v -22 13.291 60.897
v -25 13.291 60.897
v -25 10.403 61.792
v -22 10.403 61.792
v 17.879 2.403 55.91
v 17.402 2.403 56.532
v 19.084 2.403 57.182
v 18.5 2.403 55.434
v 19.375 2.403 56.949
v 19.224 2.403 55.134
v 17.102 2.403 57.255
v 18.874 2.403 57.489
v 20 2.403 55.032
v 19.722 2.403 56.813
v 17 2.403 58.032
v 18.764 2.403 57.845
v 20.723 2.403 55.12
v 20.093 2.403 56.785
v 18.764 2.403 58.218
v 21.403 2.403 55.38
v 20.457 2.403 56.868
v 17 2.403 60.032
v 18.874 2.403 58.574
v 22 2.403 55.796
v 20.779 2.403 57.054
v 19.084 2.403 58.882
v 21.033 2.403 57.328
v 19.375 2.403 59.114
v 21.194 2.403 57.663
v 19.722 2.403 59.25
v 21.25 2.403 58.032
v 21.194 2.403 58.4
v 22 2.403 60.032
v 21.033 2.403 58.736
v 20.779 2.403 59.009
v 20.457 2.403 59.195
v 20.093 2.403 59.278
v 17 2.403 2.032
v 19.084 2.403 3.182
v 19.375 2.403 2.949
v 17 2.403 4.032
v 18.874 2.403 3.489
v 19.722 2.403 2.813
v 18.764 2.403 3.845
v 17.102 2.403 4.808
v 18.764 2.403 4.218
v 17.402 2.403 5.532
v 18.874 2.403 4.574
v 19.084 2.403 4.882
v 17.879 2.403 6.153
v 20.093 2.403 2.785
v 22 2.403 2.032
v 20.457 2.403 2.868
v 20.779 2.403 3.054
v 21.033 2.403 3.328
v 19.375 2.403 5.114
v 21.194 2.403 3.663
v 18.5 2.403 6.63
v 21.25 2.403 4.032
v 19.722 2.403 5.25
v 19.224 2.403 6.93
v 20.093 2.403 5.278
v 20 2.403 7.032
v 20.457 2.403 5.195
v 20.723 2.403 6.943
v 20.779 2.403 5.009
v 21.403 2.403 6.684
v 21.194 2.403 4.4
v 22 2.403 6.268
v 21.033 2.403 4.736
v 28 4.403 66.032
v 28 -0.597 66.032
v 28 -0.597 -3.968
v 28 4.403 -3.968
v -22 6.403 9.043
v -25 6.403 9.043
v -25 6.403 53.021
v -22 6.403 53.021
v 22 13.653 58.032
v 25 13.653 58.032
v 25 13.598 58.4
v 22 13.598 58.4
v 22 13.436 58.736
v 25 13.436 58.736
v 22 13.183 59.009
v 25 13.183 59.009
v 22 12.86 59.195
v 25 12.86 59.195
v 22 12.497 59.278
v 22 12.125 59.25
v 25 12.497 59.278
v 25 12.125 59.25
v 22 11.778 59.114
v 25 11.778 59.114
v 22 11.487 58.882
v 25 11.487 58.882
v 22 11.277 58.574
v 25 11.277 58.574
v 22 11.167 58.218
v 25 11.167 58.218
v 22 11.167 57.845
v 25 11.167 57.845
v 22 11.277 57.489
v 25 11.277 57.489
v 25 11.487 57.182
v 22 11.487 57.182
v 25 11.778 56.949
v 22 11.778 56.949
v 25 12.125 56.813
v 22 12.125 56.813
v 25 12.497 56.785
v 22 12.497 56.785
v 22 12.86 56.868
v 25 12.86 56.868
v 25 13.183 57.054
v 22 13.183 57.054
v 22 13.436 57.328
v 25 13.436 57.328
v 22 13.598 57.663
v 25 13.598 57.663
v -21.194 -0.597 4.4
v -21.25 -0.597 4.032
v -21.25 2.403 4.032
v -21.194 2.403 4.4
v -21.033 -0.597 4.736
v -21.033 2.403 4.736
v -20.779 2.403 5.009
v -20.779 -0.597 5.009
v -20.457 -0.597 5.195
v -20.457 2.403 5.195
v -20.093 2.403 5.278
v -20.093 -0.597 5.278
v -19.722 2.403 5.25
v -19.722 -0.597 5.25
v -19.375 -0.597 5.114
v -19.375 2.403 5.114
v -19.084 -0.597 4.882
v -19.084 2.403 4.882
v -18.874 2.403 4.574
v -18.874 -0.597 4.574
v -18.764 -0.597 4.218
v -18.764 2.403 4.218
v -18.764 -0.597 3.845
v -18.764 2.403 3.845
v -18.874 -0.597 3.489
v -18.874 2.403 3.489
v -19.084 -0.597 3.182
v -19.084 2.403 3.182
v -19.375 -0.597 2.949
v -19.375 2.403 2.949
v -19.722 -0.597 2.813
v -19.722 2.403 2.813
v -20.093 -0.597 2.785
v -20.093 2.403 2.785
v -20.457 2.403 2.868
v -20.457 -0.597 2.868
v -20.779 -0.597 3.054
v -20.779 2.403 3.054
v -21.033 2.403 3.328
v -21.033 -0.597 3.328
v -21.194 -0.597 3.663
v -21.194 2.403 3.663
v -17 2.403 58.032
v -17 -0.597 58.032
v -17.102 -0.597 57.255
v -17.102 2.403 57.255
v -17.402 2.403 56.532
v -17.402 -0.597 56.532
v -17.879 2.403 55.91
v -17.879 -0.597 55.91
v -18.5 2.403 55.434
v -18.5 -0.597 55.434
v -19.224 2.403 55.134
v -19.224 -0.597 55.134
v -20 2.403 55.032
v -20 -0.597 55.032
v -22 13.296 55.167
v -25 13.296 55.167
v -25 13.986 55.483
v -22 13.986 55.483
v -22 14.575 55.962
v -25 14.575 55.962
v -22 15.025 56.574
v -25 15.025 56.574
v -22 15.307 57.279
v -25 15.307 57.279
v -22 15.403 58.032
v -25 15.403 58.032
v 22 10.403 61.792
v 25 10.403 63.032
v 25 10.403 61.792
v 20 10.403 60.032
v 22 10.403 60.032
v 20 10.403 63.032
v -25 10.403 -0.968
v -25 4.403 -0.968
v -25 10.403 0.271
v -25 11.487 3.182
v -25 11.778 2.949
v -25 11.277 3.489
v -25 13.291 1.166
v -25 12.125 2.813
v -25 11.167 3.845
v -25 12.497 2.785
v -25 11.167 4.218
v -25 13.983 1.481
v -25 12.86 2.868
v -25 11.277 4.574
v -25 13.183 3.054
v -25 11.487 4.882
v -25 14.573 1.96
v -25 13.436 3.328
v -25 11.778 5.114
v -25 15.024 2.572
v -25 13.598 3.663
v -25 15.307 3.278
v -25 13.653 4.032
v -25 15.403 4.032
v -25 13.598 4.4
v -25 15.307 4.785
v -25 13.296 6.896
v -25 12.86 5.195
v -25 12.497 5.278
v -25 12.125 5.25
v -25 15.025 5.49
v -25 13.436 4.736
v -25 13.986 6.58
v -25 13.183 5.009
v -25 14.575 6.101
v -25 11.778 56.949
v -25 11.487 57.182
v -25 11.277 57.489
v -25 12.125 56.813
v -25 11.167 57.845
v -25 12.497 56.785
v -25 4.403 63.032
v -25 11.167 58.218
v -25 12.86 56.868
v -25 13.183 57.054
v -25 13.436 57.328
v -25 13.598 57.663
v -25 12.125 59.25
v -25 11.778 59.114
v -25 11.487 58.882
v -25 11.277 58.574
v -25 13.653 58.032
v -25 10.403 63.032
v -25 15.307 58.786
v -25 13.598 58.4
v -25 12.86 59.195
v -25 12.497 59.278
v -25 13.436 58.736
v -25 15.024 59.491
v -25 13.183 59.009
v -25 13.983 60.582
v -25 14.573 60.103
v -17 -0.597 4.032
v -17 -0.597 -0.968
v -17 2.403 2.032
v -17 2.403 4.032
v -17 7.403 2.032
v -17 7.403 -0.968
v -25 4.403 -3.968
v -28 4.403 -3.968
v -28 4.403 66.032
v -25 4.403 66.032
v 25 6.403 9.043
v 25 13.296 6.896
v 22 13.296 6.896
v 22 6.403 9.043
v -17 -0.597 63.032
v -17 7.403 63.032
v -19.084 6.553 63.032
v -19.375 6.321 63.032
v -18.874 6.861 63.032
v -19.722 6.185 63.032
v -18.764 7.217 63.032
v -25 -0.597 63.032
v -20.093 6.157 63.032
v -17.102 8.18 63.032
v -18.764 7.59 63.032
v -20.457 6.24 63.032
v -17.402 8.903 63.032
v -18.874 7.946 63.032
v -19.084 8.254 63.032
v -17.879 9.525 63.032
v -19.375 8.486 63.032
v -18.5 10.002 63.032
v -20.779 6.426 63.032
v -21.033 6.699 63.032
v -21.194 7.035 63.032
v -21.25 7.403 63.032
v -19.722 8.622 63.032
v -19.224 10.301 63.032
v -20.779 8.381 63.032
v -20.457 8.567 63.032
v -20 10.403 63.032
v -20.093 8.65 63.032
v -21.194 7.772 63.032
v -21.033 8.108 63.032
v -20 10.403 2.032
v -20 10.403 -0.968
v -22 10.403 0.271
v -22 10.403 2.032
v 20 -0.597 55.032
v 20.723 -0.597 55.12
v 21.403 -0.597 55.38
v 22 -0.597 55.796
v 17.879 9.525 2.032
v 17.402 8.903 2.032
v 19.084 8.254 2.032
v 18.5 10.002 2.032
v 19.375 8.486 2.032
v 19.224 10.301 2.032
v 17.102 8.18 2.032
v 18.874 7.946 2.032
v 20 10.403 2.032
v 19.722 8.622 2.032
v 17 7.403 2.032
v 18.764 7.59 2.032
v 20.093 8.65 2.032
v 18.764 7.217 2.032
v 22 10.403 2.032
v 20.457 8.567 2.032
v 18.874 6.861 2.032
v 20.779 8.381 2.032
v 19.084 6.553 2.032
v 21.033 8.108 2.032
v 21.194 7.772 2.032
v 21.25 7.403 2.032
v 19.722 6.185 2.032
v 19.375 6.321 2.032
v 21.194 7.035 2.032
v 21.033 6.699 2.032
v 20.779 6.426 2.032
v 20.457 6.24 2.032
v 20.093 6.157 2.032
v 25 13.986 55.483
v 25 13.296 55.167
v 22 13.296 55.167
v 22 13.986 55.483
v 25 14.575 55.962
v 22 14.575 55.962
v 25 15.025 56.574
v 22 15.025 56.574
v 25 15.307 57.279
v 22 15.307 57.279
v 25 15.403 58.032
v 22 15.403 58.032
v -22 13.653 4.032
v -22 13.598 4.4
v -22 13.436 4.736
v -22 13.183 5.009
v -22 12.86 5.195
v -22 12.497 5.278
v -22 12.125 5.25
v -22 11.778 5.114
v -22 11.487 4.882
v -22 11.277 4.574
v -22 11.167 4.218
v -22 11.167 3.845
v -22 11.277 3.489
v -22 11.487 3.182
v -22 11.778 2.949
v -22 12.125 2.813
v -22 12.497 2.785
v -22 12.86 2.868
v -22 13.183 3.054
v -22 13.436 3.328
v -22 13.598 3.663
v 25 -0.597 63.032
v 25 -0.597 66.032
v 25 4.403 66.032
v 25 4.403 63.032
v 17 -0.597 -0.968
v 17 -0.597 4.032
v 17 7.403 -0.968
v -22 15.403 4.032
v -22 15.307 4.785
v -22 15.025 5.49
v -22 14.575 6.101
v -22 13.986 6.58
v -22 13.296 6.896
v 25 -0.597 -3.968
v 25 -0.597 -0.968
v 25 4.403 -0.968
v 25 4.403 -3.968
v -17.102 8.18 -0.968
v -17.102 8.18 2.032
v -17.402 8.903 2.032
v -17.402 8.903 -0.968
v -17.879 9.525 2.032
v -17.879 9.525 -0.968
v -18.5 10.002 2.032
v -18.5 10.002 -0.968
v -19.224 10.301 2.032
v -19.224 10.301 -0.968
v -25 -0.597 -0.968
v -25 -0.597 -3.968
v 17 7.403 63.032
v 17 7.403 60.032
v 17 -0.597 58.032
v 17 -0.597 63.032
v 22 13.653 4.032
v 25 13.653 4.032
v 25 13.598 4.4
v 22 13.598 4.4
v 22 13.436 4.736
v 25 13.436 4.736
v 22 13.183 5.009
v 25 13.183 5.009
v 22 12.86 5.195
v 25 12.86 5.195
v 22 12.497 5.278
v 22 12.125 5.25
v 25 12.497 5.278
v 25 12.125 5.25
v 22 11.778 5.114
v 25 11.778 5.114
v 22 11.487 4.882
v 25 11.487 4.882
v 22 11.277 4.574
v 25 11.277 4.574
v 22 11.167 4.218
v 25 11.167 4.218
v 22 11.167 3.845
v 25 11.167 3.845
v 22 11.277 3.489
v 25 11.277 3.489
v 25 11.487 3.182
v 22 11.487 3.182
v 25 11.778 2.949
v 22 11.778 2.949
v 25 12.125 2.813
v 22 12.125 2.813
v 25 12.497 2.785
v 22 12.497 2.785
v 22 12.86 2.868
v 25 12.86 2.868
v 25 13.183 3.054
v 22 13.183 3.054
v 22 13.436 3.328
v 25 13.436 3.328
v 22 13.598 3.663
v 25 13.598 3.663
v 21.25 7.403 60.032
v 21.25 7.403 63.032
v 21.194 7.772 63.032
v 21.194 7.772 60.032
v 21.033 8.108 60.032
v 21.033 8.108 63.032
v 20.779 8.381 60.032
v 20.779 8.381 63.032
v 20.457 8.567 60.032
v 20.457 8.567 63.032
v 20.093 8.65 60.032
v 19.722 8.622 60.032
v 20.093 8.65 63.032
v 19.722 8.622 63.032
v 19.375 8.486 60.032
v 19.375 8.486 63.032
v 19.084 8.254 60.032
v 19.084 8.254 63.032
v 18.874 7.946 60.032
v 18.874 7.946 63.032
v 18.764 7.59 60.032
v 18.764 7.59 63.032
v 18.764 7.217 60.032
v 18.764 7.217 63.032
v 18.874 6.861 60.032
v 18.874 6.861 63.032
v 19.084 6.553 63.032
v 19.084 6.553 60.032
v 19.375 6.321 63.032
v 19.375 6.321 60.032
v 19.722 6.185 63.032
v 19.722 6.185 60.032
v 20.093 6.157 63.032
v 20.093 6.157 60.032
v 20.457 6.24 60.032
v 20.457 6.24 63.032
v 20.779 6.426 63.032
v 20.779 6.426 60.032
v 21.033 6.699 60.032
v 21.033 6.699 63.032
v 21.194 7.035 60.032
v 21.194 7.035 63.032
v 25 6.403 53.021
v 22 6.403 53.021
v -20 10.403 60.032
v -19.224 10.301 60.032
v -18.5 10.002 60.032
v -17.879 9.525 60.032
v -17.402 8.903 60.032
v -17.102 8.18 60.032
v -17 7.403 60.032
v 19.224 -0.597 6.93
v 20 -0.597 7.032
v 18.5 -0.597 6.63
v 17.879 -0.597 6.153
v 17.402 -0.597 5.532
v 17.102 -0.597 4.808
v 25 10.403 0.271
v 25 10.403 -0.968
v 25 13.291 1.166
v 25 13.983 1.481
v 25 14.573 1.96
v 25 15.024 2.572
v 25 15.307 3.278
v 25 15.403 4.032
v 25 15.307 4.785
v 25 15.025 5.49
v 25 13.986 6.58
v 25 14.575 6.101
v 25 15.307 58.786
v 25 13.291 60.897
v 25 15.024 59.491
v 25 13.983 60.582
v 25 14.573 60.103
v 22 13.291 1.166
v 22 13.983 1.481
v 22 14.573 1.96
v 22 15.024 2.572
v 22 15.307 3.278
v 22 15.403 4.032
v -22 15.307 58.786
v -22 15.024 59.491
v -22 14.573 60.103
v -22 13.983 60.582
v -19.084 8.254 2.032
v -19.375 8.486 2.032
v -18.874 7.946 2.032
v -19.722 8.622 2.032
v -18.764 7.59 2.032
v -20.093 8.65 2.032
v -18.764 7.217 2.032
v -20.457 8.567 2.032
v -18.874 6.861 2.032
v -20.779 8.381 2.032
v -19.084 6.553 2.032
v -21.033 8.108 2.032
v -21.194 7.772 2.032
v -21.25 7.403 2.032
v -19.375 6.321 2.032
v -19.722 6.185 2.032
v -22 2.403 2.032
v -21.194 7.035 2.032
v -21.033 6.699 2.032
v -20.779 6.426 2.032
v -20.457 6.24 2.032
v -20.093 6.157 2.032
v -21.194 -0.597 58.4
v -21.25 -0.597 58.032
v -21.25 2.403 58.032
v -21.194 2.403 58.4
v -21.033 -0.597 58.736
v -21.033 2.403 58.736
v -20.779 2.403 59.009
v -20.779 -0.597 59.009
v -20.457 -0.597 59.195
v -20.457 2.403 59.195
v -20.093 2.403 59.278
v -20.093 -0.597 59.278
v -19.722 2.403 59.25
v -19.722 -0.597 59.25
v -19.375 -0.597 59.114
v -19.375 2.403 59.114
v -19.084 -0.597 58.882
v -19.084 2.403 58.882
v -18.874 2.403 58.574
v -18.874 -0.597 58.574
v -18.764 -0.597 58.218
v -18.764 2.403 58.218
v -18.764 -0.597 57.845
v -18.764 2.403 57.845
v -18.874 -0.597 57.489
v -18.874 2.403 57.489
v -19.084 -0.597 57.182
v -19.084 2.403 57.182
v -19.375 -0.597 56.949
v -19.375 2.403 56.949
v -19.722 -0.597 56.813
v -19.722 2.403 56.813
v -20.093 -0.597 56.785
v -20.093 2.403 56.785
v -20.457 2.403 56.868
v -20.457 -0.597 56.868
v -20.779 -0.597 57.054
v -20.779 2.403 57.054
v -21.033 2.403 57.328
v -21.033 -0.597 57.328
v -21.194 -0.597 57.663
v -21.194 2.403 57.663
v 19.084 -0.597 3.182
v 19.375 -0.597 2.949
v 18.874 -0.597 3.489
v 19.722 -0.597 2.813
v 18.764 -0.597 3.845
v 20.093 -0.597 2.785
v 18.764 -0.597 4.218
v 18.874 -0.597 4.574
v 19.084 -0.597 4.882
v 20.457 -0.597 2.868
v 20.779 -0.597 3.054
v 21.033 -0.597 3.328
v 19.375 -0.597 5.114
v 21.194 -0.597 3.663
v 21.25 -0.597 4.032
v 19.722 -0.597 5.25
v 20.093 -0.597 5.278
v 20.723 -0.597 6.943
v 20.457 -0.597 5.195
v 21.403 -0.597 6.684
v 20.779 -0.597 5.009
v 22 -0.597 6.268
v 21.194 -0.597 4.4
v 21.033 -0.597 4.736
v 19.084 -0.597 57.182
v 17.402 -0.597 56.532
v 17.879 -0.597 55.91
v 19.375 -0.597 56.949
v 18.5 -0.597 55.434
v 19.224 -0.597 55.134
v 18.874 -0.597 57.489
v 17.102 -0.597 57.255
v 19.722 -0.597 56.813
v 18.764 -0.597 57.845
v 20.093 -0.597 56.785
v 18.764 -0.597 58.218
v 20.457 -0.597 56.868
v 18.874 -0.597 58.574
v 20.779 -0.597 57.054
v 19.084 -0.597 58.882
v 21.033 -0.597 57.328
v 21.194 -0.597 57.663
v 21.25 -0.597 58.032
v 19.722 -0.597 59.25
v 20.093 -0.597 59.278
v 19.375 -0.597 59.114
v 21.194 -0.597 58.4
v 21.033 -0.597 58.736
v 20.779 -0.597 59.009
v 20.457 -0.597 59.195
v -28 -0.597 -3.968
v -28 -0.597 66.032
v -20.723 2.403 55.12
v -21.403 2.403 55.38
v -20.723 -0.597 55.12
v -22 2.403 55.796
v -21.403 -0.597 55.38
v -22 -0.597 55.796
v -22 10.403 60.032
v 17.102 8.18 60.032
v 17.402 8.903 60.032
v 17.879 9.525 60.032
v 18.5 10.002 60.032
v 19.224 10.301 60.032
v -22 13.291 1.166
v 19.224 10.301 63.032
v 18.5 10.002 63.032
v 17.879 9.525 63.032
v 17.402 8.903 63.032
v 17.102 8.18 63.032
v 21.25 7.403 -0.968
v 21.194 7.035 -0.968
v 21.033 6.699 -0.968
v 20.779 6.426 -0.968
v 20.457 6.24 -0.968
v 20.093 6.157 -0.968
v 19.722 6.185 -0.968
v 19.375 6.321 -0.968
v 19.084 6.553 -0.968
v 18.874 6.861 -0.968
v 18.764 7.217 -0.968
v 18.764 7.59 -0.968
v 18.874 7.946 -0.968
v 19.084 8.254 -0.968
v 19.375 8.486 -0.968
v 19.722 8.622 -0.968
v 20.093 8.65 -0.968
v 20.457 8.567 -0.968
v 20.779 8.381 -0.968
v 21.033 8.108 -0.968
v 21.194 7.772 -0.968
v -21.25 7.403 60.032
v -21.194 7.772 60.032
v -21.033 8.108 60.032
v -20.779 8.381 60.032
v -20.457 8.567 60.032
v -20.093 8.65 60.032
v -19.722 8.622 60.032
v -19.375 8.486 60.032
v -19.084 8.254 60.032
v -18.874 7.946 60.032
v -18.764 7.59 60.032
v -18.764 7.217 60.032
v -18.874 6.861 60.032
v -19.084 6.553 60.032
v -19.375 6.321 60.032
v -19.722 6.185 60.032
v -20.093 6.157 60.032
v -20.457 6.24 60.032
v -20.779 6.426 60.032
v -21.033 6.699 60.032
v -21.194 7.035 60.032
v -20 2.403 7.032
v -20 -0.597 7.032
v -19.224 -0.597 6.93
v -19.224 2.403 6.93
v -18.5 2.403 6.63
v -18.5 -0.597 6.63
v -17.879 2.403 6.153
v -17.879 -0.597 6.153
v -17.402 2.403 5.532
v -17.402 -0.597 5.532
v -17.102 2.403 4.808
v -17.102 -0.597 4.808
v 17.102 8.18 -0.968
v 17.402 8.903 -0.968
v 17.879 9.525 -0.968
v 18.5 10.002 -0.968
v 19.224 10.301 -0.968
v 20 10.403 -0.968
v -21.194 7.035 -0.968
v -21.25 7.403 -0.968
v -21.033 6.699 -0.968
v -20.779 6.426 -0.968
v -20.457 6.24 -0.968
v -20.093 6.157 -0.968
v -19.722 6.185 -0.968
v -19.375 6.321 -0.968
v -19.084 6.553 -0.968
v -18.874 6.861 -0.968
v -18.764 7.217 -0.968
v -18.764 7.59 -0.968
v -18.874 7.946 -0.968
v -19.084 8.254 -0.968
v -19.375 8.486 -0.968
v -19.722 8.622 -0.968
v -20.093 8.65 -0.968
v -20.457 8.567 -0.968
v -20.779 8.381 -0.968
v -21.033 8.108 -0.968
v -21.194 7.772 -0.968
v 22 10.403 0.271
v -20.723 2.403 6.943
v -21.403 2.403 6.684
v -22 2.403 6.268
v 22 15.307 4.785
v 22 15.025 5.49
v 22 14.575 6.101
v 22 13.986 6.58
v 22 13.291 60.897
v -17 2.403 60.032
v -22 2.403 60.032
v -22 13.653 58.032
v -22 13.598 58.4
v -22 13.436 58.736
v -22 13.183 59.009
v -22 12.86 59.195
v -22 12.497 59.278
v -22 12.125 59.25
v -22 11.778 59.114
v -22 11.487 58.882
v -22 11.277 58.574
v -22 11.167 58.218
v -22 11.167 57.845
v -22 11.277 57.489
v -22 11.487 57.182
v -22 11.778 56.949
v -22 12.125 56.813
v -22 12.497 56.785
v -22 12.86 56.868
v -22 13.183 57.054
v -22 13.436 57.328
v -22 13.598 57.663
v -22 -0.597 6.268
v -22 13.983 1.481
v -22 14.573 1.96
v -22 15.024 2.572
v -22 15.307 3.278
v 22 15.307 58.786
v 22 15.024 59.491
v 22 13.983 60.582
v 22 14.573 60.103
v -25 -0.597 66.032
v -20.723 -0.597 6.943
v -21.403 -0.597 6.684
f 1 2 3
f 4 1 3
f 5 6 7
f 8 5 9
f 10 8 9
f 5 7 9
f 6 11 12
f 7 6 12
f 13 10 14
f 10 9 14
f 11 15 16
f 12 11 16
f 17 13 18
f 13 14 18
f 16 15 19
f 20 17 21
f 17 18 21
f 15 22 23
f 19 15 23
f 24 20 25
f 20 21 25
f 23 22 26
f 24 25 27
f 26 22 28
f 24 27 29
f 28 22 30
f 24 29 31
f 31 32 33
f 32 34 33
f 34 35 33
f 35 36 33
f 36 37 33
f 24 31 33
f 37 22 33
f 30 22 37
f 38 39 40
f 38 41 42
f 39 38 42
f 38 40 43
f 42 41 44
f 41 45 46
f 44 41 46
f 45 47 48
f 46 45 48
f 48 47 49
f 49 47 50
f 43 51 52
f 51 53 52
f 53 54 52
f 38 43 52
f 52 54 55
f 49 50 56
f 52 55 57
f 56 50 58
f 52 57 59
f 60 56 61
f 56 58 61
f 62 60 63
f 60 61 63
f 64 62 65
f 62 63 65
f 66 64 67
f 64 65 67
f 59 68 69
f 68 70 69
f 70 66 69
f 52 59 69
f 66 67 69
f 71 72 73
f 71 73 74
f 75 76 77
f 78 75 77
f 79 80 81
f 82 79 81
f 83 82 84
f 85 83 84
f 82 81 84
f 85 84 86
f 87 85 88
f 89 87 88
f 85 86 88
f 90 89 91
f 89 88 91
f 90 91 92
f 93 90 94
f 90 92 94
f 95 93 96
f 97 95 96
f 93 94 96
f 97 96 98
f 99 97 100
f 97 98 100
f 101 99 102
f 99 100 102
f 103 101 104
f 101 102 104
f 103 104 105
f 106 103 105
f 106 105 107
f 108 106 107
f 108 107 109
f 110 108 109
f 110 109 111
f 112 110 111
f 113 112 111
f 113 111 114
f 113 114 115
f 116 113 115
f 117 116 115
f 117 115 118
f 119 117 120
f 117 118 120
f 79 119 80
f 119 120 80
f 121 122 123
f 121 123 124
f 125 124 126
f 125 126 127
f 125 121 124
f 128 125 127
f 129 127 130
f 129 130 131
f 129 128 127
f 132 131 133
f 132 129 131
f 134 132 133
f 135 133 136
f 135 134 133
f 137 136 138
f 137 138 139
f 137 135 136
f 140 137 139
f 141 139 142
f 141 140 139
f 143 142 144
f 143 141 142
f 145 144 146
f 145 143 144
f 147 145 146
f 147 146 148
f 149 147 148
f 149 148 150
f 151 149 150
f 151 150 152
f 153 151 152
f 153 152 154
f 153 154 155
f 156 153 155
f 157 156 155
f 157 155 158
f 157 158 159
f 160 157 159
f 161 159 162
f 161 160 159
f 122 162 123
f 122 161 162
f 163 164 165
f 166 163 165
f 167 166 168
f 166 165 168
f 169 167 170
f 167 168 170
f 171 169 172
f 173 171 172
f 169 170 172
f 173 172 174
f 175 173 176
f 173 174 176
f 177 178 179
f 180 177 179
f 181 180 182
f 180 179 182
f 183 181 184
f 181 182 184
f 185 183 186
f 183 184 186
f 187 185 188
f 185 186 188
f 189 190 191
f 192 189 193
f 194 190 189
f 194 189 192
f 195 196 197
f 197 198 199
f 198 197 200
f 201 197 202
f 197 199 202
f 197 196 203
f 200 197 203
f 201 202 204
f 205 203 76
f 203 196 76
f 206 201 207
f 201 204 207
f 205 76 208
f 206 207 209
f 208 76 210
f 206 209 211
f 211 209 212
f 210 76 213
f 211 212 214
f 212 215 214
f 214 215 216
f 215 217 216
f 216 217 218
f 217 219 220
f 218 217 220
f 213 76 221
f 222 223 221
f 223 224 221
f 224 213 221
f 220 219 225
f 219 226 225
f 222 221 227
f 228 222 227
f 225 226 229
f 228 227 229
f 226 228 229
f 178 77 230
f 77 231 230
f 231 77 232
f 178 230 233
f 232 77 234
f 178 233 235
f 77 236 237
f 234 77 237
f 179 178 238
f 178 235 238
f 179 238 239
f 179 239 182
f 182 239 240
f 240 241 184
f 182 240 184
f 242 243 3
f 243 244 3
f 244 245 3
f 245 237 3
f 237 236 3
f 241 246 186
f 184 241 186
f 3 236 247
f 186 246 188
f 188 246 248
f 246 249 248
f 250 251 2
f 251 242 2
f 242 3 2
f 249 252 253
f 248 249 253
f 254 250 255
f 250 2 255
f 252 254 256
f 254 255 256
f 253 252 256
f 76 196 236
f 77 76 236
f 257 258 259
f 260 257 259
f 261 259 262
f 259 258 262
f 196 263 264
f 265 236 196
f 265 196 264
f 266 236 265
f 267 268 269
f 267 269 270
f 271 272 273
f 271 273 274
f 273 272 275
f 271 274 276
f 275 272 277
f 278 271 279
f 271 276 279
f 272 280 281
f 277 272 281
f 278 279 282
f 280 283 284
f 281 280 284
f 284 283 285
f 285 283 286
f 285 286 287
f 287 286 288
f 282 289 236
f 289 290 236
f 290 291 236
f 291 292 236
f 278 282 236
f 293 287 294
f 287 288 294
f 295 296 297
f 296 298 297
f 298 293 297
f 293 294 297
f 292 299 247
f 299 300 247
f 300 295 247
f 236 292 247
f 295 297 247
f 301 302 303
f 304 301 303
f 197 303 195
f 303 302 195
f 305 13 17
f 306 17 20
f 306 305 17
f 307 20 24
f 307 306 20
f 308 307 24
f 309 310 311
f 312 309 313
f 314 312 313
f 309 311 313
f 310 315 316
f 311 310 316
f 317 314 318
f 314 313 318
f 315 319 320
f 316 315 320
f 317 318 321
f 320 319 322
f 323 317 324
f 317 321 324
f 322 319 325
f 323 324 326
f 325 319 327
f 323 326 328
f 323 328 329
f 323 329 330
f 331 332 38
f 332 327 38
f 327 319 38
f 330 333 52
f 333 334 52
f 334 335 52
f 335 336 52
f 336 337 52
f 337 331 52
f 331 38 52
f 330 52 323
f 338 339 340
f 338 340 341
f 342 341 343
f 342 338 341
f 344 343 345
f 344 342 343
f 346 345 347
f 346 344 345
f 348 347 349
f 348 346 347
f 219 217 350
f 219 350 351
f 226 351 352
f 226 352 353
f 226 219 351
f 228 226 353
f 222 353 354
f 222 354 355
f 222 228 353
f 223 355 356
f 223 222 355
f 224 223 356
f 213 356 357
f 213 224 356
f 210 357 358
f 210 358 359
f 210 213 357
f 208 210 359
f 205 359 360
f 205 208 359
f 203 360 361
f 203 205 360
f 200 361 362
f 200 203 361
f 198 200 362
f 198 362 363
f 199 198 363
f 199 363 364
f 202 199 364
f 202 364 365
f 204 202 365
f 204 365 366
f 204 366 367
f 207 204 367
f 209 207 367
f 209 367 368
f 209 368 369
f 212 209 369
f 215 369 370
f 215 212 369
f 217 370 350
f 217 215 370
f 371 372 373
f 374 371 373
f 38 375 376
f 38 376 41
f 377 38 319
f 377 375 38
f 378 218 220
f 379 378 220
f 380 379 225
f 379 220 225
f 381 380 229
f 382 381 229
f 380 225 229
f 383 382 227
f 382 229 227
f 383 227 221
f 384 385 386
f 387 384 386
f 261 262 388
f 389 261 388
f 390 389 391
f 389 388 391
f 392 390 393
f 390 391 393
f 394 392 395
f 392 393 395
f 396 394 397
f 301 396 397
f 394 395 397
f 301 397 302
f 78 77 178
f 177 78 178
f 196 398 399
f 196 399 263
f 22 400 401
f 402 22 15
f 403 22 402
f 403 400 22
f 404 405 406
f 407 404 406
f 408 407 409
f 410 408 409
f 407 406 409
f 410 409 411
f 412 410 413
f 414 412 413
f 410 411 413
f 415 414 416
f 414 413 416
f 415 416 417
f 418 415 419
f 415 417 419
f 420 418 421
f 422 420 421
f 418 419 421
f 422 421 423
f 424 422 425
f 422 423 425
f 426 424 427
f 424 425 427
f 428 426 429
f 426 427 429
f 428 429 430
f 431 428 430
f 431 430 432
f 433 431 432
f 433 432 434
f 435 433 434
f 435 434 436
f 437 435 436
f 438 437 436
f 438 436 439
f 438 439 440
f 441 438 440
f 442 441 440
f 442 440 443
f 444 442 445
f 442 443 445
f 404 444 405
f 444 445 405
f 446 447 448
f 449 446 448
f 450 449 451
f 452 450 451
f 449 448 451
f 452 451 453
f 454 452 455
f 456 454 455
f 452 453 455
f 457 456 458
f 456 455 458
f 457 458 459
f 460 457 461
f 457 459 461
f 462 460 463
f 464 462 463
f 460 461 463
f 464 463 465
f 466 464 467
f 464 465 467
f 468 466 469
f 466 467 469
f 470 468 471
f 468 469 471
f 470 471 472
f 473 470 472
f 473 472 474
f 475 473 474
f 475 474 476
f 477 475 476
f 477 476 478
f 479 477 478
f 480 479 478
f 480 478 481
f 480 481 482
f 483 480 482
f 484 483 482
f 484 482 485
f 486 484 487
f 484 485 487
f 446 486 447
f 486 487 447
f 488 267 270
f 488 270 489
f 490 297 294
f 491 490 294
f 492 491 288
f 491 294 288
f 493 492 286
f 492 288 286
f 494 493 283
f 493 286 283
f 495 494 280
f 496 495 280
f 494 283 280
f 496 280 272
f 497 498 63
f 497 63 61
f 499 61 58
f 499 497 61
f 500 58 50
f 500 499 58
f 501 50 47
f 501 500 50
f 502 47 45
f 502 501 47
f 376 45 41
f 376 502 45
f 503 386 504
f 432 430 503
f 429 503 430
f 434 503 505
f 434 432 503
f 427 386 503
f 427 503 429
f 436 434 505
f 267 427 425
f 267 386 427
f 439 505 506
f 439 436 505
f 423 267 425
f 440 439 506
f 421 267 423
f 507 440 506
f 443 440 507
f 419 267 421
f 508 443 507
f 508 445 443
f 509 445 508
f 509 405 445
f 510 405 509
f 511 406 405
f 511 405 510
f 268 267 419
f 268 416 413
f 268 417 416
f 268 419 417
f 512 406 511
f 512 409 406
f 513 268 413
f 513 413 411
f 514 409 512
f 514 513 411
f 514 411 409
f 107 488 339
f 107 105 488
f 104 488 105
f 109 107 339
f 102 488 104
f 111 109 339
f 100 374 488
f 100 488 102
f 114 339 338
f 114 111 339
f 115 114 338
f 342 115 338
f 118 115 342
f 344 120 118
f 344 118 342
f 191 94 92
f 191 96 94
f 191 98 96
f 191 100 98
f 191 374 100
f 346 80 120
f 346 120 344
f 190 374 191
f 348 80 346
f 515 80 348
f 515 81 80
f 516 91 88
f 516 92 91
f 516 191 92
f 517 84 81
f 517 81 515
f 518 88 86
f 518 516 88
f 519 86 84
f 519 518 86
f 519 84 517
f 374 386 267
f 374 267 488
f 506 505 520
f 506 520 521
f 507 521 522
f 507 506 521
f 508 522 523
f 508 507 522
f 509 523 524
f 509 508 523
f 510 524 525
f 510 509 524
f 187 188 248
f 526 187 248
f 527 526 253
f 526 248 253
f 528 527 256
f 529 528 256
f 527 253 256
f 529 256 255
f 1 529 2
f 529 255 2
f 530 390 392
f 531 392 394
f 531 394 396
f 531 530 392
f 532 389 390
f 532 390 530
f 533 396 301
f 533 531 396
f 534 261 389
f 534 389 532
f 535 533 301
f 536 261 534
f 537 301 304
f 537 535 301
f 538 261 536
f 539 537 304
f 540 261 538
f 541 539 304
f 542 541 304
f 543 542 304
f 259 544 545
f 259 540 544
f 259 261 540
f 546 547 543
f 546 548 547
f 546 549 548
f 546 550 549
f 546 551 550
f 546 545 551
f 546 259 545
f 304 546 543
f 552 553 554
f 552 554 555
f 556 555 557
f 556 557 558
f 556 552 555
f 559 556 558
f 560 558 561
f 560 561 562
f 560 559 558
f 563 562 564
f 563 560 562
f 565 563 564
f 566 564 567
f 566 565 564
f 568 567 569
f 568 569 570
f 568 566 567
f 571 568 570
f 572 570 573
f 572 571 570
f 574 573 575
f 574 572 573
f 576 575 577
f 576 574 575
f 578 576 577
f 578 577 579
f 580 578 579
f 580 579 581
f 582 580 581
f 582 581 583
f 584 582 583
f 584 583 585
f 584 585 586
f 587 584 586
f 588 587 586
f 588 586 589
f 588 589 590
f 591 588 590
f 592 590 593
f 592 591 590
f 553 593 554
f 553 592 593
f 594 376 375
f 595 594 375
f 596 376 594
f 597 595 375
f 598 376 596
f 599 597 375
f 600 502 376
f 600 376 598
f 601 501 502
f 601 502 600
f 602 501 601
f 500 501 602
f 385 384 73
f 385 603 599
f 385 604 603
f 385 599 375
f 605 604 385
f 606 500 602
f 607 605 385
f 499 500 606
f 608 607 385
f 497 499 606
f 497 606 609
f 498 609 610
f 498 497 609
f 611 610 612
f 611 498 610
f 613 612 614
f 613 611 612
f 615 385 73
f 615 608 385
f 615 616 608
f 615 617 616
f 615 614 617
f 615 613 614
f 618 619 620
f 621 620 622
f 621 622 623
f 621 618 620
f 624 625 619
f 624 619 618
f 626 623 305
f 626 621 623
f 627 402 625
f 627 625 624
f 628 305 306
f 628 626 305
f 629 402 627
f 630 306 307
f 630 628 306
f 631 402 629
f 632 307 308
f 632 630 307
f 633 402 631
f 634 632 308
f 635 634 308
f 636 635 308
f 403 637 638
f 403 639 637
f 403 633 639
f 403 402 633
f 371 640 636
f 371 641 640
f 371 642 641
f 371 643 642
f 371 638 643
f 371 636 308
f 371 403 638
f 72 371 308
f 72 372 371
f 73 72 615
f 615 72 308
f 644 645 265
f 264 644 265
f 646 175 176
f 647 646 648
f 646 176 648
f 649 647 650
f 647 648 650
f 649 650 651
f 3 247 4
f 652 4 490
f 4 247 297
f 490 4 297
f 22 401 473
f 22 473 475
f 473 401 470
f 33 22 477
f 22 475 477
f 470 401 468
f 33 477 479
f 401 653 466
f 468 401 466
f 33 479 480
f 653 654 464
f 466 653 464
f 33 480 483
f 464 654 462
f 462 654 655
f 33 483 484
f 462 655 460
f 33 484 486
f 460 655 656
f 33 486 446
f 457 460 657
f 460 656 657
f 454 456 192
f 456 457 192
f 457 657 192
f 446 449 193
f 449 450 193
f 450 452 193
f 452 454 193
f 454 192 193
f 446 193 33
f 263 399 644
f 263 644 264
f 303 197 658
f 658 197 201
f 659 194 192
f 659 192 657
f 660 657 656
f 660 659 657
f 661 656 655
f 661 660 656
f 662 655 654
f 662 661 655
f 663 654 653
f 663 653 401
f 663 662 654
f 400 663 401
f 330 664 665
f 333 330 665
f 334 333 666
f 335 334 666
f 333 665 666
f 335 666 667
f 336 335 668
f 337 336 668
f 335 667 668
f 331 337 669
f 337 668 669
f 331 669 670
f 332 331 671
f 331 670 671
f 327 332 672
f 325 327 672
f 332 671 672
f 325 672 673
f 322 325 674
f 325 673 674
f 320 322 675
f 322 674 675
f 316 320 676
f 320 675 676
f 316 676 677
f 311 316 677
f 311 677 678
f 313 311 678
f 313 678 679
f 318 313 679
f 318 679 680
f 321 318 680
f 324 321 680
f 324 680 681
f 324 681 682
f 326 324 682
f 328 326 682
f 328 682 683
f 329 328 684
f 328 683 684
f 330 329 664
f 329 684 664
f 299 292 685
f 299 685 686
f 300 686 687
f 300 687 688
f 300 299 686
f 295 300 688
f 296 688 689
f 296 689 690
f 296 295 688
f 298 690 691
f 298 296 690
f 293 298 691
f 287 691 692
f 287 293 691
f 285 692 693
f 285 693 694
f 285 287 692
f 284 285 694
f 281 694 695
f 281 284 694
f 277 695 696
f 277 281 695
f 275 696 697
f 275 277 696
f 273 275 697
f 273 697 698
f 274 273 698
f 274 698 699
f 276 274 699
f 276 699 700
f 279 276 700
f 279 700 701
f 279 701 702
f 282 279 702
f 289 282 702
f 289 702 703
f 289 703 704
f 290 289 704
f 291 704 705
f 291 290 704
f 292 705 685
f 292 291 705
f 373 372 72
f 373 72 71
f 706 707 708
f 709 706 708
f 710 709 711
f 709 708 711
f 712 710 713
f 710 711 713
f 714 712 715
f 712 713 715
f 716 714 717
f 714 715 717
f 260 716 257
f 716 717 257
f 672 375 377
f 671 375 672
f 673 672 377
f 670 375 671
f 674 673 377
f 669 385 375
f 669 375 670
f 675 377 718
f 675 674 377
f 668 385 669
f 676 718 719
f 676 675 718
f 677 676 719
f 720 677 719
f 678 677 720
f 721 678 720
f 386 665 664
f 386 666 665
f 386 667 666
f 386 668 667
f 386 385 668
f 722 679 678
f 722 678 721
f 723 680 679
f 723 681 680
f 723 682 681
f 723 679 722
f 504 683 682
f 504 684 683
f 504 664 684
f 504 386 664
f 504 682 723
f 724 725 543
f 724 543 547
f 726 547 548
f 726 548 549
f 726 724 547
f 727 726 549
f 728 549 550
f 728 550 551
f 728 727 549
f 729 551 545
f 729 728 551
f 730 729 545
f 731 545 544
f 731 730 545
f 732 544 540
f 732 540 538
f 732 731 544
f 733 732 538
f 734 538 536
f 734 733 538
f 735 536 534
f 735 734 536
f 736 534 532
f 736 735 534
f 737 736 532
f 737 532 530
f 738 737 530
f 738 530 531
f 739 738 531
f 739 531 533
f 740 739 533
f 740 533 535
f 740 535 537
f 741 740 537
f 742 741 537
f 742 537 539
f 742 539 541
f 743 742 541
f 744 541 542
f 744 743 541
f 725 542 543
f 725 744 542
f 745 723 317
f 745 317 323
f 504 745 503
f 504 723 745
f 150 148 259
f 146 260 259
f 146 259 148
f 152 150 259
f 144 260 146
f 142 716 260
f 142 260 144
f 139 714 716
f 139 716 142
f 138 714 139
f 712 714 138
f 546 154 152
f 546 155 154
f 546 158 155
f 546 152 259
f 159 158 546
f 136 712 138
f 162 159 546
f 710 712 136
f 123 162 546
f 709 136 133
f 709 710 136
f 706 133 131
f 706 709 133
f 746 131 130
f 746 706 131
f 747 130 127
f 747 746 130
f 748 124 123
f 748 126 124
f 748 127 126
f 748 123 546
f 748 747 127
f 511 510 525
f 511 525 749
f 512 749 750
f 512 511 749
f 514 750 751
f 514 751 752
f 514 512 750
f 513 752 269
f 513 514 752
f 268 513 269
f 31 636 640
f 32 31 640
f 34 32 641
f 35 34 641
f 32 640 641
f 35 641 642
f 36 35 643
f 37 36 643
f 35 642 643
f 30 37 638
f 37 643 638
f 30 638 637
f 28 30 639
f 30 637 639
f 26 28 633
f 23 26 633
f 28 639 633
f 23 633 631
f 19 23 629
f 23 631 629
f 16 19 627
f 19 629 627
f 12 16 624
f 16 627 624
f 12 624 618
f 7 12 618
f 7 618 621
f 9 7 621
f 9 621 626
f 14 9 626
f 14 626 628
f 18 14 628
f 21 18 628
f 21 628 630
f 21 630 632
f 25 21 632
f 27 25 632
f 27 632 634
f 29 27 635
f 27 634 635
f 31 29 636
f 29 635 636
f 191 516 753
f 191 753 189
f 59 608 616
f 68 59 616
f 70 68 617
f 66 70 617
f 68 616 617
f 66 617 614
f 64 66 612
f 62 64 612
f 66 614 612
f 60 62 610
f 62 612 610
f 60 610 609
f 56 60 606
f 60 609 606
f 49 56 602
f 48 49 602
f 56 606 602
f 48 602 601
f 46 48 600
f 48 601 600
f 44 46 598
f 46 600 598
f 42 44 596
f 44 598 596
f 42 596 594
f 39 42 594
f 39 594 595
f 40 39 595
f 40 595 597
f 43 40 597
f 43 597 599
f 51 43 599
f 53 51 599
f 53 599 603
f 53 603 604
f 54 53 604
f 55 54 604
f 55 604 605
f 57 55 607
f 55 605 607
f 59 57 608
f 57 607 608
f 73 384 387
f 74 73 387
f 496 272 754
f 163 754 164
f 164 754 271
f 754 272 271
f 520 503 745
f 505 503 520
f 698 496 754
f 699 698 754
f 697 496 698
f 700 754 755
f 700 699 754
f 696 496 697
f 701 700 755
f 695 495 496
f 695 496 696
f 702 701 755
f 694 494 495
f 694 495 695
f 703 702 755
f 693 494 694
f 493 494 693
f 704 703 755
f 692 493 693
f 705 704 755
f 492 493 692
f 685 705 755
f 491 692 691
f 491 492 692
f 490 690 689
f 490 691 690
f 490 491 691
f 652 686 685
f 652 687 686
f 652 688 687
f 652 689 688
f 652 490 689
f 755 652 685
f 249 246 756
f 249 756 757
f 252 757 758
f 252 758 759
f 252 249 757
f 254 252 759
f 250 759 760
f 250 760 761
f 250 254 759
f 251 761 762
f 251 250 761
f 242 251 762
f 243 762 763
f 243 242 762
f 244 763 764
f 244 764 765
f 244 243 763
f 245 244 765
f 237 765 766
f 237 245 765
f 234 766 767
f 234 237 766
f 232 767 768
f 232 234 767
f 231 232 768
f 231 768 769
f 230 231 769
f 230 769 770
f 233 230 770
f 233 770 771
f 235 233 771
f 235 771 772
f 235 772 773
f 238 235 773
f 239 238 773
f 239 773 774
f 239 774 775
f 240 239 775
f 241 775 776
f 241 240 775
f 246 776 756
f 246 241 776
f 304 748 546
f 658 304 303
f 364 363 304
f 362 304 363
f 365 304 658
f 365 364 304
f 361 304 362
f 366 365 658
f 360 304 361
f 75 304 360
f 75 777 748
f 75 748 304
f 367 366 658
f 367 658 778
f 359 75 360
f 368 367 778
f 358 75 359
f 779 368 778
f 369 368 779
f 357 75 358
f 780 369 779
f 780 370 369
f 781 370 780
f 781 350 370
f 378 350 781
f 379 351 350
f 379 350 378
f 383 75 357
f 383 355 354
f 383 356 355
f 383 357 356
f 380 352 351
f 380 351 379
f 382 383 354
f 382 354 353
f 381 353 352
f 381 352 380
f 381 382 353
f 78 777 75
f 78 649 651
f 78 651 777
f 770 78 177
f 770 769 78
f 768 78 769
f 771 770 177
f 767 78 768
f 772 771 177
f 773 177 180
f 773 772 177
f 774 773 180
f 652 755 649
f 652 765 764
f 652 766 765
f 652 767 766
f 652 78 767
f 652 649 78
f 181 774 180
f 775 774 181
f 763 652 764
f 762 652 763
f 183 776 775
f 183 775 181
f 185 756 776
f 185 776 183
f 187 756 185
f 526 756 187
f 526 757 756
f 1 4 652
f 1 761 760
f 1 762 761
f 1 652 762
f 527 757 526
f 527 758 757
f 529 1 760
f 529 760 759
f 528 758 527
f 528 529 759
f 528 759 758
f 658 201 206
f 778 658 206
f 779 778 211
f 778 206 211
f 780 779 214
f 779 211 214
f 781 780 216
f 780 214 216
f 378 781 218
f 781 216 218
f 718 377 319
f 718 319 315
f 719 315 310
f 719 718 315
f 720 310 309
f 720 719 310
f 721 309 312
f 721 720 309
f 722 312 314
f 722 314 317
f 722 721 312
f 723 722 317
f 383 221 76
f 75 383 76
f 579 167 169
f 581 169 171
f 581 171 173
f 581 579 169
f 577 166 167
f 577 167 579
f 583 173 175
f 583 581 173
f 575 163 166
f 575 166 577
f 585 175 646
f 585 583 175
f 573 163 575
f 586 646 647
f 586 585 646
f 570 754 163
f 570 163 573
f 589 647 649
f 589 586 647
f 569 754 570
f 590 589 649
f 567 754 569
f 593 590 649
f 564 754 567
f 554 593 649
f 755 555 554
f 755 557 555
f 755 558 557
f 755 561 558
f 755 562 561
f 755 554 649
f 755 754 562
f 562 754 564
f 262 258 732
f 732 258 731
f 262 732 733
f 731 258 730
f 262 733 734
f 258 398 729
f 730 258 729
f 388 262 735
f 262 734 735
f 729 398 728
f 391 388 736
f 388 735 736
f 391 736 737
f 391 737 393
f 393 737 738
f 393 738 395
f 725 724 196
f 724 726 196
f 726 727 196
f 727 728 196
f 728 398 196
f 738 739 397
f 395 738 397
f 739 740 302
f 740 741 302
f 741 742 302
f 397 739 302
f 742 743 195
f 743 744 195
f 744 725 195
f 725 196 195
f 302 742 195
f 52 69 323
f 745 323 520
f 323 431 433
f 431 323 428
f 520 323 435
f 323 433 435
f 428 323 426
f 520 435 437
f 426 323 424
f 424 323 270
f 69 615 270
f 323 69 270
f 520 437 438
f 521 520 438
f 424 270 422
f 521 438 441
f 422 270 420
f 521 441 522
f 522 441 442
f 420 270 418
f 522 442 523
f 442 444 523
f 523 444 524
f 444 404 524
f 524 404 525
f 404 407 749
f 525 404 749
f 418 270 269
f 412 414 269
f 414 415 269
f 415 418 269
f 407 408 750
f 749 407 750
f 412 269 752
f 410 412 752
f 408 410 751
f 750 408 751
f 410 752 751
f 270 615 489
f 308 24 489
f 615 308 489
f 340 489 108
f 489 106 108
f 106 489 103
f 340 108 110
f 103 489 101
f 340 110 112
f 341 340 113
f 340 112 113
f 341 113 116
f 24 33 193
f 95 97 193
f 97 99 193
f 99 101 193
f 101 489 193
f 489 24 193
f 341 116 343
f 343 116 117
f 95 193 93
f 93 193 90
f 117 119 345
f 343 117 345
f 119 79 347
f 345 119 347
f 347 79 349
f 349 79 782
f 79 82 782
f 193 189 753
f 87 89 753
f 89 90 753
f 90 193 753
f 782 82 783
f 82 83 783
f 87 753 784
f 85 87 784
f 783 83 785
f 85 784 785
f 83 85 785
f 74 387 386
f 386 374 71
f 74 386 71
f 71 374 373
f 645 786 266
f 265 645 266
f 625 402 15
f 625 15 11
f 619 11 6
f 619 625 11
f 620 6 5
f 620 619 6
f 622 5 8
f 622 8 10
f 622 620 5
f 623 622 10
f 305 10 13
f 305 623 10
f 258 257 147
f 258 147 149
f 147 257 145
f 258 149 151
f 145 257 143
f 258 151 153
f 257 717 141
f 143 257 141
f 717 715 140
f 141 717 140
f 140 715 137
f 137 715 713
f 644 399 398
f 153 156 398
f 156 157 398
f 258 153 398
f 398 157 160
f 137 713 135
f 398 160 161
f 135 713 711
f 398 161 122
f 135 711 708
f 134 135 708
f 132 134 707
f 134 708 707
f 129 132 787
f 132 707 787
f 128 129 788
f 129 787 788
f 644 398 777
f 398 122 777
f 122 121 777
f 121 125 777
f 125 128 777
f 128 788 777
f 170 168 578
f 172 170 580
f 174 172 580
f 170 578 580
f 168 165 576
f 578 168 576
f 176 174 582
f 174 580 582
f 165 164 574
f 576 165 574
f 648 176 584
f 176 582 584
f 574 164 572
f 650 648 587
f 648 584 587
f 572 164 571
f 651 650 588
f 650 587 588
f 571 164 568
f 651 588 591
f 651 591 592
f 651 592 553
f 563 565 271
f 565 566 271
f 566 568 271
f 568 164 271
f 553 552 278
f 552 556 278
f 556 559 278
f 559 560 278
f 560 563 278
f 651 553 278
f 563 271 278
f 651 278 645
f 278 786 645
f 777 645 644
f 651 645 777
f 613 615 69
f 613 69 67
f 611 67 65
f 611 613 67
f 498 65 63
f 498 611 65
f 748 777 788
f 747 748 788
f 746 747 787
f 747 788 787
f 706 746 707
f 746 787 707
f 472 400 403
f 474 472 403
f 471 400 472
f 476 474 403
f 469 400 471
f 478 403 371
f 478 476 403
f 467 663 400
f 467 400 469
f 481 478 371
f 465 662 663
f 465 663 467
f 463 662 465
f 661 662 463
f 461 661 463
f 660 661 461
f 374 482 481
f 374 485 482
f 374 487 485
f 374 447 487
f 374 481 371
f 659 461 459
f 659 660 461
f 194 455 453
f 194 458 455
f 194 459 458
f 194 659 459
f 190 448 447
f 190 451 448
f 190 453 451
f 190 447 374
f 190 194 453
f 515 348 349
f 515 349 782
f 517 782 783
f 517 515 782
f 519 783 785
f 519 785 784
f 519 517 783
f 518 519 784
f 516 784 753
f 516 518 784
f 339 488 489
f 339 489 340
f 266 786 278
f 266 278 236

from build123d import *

# Parameters (mm, degrees)
F1_W     = 5
F1_H     = 3
F1_H_2   = 64
F2_DEPTH = 3
F1_R     = 1.25
F3_DEPTH = 3
F4_R     = 1.25
F5_DEPTH = 3
F6_R     = 1.25
F7_DEPTH = 3
F8_R     = 1.25
F9_DEPTH = 3


with BuildPart() as f2:
    # F1 (on offset) → F2 (new body)
    with BuildSketch(Plane.YZ.offset(25)):
        with Locations((1.903469, 64.53177)):
            Rectangle(F1_W, F1_H)
        with Locations((1.903469, 31.03177)):
            Rectangle(F1_W, F1_H_2)
        with Locations((1.903469, -2.46823)):
            Rectangle(F1_W, F1_H)
    extrude(amount=F2_DEPTH)

    # F1 (on offset) → F3 (join)
    with BuildSketch(Plane.YZ.offset(25)):
        with BuildLine():
            ThreePointArc((13.295593, 6.896052), (9.40347, 4.033942), (13.291445, 1.166199))
            ThreePointArc((13.291445, 1.166199), (14.818415, 2.251872), (15.403469, 4.03177))
            ThreePointArc((15.403469, 4.03177), (14.819703, 5.809919), (13.295593, 6.896052))
        make_face()
        with Locations((12.403469, 4.03177)):
            Circle(F1_R, mode=Mode.SUBTRACT)
        with BuildLine():
            ThreePointArc((15.403469, 58.03177), (14.818415, 59.811668), (13.291445, 60.897341))
            ThreePointArc((13.291445, 60.897341), (9.40347, 58.029598), (13.295593, 55.167488))
            ThreePointArc((13.295593, 55.167488), (14.819703, 56.253621), (15.403469, 58.03177))
        make_face()
        with Locations((12.403469, 58.03177)):
            Circle(F1_R, mode=Mode.SUBTRACT)
        with BuildLine():
            Line((13.291445, 60.897341), (6.403469, 63.03177))
            Line((6.403469, 63.03177), (6.403469, 53.02083))
            Line((6.403469, 53.02083), (13.295593, 55.167488))
            ThreePointArc((13.295593, 55.167488), (9.40347, 58.029598), (13.291445, 60.897341))
        make_face()
        with BuildLine():
            Line((6.403469, 9.04271), (6.403469, -0.96823))
            Line((6.403469, -0.96823), (13.291445, 1.166199))
            ThreePointArc((13.291445, 1.166199), (9.40347, 4.033942), (13.295593, 6.896052))
            Line((13.295593, 6.896052), (6.403469, 9.04271))
        make_face()
        with Locations((1.903469, 31.03177)):
            Rectangle(F1_W, F1_H_2)
        Polygon((6.403469, 63.03177), (4.403469, 63.03177), (4.403469, -0.96823), (6.403469, -0.96823), (6.403469, 9.04271), (6.403469, 53.02083), align=None)
    extrude(amount=-F3_DEPTH)

    # F4 (on face) → F5 (join)
    with BuildSketch(Plane.XZ.offset(0.596531)):
        with BuildLine():
            ThreePointArc((20, 61.03177), (17.87868, 60.15309), (17, 58.03177))
            ThreePointArc((17, 58.03177), (17.87868, 55.91045), (20, 55.03177))
            ThreePointArc((20, 55.03177), (22.12132, 55.91045), (23, 58.03177))
            ThreePointArc((23, 58.03177), (22.12132, 60.15309), (20, 61.03177))
        make_face()
        with Locations((20, 58.03177)):
            Circle(F4_R, mode=Mode.SUBTRACT)
        with BuildLine():
            Line((17, 61.03177), (17, 58.03177))
            ThreePointArc((17, 58.03177), (17.87868, 60.15309), (20, 61.03177))
            Line((20, 61.03177), (17, 61.03177))
        make_face()
        with BuildLine():
            ThreePointArc((20, 1.03177), (22.12132, 1.91045), (23, 4.03177))
            ThreePointArc((23, 4.03177), (22.12132, 6.15309), (20, 7.03177))
            ThreePointArc((20, 7.03177), (17.87868, 6.15309), (17, 4.03177))
            ThreePointArc((17, 4.03177), (17.87868, 1.91045), (20, 1.03177))
        make_face()
        with Locations((20, 4.03177)):
            Circle(F4_R, mode=Mode.SUBTRACT)
        with BuildLine():
            Line((17, 1.03177), (20, 1.03177))
            ThreePointArc((20, 1.03177), (17.87868, 1.91045), (17, 4.03177))
            Line((17, 4.03177), (17, 1.03177))
        make_face()
    extrude(amount=-F5_DEPTH)

    # F6 (on face) → F7 (join)
    with BuildSketch(Plane.XY.offset(63.03177)):
        with BuildLine():
            ThreePointArc((17, 7.403469), (20, 4.403469), (23, 7.403469))
            ThreePointArc((23, 7.403469), (22.12132, 9.524789), (20, 10.403469))
            ThreePointArc((20, 10.403469), (17.87868, 9.524789), (17, 7.403469))
        make_face()
        with Locations((20, 7.403469)):
            Circle(F6_R, mode=Mode.SUBTRACT)
        with BuildLine():
            ThreePointArc((20, 10.403469), (22.12132, 9.524789), (23, 7.403469))
            ThreePointArc((23, 7.403469), (20, 4.403469), (17, 7.403469))
            Line((17, 7.403469), (17, -0.596531))
            Line((17, -0.596531), (20, -0.596531))
            Line((20, -0.596531), (25, 4.403469))
            Line((25, 4.403469), (25, 6.403469))
            Line((25, 6.403469), (25, 10.403469))
            Line((25, 10.403469), (20, 10.403469))
        make_face()
        Polygon((25, 4.403469), (20, -0.596531), (22, -0.596531), (25, -0.596531), align=None)
        with BuildLine():
            ThreePointArc((22, 5.167401), (18.775255, 4.664856), (17, 7.403469))
            Line((17, 7.403469), (17, -0.596531))
            Line((17, -0.596531), (20, -0.596531))
            Line((20, -0.596531), (22, 1.403469))
            Line((22, 1.403469), (22, 5.167401))
        make_face()
        with BuildLine():
            ThreePointArc((20, 10.403469), (22.12132, 9.524789), (23, 7.403469))
            ThreePointArc((23, 7.403469), (22.956796, 6.896163), (22.828427, 6.403469))
            Line((22.828427, 6.403469), (25, 6.403469))
            Line((25, 6.403469), (25, 10.403469))
            Line((25, 10.403469), (20, 10.403469))
        make_face()
    extrude(amount=-F7_DEPTH)

    # F8 (on face) → F9 (join)
    with BuildSketch(Plane(origin=(0, 0, -0.96823), x_dir=(1, 0, 0), z_dir=(0, 0, -1))):
        with BuildLine():
            ThreePointArc((20, -10.403469), (22.12132, -9.524789), (23, -7.403469))
            ThreePointArc((23, -7.403469), (20, -4.403469), (17, -7.403469))
            ThreePointArc((17, -7.403469), (17.87868, -9.524789), (20, -10.403469))
        make_face()
        with Locations((20, -7.403469)):
            Circle(F8_R, mode=Mode.SUBTRACT)
        with BuildLine():
            Line((17, 0.596531), (17, -7.403469))
            ThreePointArc((17, -7.403469), (18.775255, -4.664856), (22, -5.167401))
            Line((22, -5.167401), (22, 0.596531))
            Line((22, 0.596531), (17, 0.596531))
        make_face()
        with BuildLine():
            ThreePointArc((23, -7.403469), (22.12132, -9.524789), (20, -10.403469))
            Line((20, -10.403469), (25, -10.403469))
            Line((25, -10.403469), (25, -6.403469))
            Line((25, -6.403469), (22.828427, -6.403469))
            ThreePointArc((22.828427, -6.403469), (22.956796, -6.896163), (23, -7.403469))
        make_face()
    extrude(amount=-F9_DEPTH)


with BuildPart() as f10_1:
    # F10: instance of F2
    add(f2.part.mirror(Plane.YZ))


solid = Compound([f2.part, f10_1.part])
